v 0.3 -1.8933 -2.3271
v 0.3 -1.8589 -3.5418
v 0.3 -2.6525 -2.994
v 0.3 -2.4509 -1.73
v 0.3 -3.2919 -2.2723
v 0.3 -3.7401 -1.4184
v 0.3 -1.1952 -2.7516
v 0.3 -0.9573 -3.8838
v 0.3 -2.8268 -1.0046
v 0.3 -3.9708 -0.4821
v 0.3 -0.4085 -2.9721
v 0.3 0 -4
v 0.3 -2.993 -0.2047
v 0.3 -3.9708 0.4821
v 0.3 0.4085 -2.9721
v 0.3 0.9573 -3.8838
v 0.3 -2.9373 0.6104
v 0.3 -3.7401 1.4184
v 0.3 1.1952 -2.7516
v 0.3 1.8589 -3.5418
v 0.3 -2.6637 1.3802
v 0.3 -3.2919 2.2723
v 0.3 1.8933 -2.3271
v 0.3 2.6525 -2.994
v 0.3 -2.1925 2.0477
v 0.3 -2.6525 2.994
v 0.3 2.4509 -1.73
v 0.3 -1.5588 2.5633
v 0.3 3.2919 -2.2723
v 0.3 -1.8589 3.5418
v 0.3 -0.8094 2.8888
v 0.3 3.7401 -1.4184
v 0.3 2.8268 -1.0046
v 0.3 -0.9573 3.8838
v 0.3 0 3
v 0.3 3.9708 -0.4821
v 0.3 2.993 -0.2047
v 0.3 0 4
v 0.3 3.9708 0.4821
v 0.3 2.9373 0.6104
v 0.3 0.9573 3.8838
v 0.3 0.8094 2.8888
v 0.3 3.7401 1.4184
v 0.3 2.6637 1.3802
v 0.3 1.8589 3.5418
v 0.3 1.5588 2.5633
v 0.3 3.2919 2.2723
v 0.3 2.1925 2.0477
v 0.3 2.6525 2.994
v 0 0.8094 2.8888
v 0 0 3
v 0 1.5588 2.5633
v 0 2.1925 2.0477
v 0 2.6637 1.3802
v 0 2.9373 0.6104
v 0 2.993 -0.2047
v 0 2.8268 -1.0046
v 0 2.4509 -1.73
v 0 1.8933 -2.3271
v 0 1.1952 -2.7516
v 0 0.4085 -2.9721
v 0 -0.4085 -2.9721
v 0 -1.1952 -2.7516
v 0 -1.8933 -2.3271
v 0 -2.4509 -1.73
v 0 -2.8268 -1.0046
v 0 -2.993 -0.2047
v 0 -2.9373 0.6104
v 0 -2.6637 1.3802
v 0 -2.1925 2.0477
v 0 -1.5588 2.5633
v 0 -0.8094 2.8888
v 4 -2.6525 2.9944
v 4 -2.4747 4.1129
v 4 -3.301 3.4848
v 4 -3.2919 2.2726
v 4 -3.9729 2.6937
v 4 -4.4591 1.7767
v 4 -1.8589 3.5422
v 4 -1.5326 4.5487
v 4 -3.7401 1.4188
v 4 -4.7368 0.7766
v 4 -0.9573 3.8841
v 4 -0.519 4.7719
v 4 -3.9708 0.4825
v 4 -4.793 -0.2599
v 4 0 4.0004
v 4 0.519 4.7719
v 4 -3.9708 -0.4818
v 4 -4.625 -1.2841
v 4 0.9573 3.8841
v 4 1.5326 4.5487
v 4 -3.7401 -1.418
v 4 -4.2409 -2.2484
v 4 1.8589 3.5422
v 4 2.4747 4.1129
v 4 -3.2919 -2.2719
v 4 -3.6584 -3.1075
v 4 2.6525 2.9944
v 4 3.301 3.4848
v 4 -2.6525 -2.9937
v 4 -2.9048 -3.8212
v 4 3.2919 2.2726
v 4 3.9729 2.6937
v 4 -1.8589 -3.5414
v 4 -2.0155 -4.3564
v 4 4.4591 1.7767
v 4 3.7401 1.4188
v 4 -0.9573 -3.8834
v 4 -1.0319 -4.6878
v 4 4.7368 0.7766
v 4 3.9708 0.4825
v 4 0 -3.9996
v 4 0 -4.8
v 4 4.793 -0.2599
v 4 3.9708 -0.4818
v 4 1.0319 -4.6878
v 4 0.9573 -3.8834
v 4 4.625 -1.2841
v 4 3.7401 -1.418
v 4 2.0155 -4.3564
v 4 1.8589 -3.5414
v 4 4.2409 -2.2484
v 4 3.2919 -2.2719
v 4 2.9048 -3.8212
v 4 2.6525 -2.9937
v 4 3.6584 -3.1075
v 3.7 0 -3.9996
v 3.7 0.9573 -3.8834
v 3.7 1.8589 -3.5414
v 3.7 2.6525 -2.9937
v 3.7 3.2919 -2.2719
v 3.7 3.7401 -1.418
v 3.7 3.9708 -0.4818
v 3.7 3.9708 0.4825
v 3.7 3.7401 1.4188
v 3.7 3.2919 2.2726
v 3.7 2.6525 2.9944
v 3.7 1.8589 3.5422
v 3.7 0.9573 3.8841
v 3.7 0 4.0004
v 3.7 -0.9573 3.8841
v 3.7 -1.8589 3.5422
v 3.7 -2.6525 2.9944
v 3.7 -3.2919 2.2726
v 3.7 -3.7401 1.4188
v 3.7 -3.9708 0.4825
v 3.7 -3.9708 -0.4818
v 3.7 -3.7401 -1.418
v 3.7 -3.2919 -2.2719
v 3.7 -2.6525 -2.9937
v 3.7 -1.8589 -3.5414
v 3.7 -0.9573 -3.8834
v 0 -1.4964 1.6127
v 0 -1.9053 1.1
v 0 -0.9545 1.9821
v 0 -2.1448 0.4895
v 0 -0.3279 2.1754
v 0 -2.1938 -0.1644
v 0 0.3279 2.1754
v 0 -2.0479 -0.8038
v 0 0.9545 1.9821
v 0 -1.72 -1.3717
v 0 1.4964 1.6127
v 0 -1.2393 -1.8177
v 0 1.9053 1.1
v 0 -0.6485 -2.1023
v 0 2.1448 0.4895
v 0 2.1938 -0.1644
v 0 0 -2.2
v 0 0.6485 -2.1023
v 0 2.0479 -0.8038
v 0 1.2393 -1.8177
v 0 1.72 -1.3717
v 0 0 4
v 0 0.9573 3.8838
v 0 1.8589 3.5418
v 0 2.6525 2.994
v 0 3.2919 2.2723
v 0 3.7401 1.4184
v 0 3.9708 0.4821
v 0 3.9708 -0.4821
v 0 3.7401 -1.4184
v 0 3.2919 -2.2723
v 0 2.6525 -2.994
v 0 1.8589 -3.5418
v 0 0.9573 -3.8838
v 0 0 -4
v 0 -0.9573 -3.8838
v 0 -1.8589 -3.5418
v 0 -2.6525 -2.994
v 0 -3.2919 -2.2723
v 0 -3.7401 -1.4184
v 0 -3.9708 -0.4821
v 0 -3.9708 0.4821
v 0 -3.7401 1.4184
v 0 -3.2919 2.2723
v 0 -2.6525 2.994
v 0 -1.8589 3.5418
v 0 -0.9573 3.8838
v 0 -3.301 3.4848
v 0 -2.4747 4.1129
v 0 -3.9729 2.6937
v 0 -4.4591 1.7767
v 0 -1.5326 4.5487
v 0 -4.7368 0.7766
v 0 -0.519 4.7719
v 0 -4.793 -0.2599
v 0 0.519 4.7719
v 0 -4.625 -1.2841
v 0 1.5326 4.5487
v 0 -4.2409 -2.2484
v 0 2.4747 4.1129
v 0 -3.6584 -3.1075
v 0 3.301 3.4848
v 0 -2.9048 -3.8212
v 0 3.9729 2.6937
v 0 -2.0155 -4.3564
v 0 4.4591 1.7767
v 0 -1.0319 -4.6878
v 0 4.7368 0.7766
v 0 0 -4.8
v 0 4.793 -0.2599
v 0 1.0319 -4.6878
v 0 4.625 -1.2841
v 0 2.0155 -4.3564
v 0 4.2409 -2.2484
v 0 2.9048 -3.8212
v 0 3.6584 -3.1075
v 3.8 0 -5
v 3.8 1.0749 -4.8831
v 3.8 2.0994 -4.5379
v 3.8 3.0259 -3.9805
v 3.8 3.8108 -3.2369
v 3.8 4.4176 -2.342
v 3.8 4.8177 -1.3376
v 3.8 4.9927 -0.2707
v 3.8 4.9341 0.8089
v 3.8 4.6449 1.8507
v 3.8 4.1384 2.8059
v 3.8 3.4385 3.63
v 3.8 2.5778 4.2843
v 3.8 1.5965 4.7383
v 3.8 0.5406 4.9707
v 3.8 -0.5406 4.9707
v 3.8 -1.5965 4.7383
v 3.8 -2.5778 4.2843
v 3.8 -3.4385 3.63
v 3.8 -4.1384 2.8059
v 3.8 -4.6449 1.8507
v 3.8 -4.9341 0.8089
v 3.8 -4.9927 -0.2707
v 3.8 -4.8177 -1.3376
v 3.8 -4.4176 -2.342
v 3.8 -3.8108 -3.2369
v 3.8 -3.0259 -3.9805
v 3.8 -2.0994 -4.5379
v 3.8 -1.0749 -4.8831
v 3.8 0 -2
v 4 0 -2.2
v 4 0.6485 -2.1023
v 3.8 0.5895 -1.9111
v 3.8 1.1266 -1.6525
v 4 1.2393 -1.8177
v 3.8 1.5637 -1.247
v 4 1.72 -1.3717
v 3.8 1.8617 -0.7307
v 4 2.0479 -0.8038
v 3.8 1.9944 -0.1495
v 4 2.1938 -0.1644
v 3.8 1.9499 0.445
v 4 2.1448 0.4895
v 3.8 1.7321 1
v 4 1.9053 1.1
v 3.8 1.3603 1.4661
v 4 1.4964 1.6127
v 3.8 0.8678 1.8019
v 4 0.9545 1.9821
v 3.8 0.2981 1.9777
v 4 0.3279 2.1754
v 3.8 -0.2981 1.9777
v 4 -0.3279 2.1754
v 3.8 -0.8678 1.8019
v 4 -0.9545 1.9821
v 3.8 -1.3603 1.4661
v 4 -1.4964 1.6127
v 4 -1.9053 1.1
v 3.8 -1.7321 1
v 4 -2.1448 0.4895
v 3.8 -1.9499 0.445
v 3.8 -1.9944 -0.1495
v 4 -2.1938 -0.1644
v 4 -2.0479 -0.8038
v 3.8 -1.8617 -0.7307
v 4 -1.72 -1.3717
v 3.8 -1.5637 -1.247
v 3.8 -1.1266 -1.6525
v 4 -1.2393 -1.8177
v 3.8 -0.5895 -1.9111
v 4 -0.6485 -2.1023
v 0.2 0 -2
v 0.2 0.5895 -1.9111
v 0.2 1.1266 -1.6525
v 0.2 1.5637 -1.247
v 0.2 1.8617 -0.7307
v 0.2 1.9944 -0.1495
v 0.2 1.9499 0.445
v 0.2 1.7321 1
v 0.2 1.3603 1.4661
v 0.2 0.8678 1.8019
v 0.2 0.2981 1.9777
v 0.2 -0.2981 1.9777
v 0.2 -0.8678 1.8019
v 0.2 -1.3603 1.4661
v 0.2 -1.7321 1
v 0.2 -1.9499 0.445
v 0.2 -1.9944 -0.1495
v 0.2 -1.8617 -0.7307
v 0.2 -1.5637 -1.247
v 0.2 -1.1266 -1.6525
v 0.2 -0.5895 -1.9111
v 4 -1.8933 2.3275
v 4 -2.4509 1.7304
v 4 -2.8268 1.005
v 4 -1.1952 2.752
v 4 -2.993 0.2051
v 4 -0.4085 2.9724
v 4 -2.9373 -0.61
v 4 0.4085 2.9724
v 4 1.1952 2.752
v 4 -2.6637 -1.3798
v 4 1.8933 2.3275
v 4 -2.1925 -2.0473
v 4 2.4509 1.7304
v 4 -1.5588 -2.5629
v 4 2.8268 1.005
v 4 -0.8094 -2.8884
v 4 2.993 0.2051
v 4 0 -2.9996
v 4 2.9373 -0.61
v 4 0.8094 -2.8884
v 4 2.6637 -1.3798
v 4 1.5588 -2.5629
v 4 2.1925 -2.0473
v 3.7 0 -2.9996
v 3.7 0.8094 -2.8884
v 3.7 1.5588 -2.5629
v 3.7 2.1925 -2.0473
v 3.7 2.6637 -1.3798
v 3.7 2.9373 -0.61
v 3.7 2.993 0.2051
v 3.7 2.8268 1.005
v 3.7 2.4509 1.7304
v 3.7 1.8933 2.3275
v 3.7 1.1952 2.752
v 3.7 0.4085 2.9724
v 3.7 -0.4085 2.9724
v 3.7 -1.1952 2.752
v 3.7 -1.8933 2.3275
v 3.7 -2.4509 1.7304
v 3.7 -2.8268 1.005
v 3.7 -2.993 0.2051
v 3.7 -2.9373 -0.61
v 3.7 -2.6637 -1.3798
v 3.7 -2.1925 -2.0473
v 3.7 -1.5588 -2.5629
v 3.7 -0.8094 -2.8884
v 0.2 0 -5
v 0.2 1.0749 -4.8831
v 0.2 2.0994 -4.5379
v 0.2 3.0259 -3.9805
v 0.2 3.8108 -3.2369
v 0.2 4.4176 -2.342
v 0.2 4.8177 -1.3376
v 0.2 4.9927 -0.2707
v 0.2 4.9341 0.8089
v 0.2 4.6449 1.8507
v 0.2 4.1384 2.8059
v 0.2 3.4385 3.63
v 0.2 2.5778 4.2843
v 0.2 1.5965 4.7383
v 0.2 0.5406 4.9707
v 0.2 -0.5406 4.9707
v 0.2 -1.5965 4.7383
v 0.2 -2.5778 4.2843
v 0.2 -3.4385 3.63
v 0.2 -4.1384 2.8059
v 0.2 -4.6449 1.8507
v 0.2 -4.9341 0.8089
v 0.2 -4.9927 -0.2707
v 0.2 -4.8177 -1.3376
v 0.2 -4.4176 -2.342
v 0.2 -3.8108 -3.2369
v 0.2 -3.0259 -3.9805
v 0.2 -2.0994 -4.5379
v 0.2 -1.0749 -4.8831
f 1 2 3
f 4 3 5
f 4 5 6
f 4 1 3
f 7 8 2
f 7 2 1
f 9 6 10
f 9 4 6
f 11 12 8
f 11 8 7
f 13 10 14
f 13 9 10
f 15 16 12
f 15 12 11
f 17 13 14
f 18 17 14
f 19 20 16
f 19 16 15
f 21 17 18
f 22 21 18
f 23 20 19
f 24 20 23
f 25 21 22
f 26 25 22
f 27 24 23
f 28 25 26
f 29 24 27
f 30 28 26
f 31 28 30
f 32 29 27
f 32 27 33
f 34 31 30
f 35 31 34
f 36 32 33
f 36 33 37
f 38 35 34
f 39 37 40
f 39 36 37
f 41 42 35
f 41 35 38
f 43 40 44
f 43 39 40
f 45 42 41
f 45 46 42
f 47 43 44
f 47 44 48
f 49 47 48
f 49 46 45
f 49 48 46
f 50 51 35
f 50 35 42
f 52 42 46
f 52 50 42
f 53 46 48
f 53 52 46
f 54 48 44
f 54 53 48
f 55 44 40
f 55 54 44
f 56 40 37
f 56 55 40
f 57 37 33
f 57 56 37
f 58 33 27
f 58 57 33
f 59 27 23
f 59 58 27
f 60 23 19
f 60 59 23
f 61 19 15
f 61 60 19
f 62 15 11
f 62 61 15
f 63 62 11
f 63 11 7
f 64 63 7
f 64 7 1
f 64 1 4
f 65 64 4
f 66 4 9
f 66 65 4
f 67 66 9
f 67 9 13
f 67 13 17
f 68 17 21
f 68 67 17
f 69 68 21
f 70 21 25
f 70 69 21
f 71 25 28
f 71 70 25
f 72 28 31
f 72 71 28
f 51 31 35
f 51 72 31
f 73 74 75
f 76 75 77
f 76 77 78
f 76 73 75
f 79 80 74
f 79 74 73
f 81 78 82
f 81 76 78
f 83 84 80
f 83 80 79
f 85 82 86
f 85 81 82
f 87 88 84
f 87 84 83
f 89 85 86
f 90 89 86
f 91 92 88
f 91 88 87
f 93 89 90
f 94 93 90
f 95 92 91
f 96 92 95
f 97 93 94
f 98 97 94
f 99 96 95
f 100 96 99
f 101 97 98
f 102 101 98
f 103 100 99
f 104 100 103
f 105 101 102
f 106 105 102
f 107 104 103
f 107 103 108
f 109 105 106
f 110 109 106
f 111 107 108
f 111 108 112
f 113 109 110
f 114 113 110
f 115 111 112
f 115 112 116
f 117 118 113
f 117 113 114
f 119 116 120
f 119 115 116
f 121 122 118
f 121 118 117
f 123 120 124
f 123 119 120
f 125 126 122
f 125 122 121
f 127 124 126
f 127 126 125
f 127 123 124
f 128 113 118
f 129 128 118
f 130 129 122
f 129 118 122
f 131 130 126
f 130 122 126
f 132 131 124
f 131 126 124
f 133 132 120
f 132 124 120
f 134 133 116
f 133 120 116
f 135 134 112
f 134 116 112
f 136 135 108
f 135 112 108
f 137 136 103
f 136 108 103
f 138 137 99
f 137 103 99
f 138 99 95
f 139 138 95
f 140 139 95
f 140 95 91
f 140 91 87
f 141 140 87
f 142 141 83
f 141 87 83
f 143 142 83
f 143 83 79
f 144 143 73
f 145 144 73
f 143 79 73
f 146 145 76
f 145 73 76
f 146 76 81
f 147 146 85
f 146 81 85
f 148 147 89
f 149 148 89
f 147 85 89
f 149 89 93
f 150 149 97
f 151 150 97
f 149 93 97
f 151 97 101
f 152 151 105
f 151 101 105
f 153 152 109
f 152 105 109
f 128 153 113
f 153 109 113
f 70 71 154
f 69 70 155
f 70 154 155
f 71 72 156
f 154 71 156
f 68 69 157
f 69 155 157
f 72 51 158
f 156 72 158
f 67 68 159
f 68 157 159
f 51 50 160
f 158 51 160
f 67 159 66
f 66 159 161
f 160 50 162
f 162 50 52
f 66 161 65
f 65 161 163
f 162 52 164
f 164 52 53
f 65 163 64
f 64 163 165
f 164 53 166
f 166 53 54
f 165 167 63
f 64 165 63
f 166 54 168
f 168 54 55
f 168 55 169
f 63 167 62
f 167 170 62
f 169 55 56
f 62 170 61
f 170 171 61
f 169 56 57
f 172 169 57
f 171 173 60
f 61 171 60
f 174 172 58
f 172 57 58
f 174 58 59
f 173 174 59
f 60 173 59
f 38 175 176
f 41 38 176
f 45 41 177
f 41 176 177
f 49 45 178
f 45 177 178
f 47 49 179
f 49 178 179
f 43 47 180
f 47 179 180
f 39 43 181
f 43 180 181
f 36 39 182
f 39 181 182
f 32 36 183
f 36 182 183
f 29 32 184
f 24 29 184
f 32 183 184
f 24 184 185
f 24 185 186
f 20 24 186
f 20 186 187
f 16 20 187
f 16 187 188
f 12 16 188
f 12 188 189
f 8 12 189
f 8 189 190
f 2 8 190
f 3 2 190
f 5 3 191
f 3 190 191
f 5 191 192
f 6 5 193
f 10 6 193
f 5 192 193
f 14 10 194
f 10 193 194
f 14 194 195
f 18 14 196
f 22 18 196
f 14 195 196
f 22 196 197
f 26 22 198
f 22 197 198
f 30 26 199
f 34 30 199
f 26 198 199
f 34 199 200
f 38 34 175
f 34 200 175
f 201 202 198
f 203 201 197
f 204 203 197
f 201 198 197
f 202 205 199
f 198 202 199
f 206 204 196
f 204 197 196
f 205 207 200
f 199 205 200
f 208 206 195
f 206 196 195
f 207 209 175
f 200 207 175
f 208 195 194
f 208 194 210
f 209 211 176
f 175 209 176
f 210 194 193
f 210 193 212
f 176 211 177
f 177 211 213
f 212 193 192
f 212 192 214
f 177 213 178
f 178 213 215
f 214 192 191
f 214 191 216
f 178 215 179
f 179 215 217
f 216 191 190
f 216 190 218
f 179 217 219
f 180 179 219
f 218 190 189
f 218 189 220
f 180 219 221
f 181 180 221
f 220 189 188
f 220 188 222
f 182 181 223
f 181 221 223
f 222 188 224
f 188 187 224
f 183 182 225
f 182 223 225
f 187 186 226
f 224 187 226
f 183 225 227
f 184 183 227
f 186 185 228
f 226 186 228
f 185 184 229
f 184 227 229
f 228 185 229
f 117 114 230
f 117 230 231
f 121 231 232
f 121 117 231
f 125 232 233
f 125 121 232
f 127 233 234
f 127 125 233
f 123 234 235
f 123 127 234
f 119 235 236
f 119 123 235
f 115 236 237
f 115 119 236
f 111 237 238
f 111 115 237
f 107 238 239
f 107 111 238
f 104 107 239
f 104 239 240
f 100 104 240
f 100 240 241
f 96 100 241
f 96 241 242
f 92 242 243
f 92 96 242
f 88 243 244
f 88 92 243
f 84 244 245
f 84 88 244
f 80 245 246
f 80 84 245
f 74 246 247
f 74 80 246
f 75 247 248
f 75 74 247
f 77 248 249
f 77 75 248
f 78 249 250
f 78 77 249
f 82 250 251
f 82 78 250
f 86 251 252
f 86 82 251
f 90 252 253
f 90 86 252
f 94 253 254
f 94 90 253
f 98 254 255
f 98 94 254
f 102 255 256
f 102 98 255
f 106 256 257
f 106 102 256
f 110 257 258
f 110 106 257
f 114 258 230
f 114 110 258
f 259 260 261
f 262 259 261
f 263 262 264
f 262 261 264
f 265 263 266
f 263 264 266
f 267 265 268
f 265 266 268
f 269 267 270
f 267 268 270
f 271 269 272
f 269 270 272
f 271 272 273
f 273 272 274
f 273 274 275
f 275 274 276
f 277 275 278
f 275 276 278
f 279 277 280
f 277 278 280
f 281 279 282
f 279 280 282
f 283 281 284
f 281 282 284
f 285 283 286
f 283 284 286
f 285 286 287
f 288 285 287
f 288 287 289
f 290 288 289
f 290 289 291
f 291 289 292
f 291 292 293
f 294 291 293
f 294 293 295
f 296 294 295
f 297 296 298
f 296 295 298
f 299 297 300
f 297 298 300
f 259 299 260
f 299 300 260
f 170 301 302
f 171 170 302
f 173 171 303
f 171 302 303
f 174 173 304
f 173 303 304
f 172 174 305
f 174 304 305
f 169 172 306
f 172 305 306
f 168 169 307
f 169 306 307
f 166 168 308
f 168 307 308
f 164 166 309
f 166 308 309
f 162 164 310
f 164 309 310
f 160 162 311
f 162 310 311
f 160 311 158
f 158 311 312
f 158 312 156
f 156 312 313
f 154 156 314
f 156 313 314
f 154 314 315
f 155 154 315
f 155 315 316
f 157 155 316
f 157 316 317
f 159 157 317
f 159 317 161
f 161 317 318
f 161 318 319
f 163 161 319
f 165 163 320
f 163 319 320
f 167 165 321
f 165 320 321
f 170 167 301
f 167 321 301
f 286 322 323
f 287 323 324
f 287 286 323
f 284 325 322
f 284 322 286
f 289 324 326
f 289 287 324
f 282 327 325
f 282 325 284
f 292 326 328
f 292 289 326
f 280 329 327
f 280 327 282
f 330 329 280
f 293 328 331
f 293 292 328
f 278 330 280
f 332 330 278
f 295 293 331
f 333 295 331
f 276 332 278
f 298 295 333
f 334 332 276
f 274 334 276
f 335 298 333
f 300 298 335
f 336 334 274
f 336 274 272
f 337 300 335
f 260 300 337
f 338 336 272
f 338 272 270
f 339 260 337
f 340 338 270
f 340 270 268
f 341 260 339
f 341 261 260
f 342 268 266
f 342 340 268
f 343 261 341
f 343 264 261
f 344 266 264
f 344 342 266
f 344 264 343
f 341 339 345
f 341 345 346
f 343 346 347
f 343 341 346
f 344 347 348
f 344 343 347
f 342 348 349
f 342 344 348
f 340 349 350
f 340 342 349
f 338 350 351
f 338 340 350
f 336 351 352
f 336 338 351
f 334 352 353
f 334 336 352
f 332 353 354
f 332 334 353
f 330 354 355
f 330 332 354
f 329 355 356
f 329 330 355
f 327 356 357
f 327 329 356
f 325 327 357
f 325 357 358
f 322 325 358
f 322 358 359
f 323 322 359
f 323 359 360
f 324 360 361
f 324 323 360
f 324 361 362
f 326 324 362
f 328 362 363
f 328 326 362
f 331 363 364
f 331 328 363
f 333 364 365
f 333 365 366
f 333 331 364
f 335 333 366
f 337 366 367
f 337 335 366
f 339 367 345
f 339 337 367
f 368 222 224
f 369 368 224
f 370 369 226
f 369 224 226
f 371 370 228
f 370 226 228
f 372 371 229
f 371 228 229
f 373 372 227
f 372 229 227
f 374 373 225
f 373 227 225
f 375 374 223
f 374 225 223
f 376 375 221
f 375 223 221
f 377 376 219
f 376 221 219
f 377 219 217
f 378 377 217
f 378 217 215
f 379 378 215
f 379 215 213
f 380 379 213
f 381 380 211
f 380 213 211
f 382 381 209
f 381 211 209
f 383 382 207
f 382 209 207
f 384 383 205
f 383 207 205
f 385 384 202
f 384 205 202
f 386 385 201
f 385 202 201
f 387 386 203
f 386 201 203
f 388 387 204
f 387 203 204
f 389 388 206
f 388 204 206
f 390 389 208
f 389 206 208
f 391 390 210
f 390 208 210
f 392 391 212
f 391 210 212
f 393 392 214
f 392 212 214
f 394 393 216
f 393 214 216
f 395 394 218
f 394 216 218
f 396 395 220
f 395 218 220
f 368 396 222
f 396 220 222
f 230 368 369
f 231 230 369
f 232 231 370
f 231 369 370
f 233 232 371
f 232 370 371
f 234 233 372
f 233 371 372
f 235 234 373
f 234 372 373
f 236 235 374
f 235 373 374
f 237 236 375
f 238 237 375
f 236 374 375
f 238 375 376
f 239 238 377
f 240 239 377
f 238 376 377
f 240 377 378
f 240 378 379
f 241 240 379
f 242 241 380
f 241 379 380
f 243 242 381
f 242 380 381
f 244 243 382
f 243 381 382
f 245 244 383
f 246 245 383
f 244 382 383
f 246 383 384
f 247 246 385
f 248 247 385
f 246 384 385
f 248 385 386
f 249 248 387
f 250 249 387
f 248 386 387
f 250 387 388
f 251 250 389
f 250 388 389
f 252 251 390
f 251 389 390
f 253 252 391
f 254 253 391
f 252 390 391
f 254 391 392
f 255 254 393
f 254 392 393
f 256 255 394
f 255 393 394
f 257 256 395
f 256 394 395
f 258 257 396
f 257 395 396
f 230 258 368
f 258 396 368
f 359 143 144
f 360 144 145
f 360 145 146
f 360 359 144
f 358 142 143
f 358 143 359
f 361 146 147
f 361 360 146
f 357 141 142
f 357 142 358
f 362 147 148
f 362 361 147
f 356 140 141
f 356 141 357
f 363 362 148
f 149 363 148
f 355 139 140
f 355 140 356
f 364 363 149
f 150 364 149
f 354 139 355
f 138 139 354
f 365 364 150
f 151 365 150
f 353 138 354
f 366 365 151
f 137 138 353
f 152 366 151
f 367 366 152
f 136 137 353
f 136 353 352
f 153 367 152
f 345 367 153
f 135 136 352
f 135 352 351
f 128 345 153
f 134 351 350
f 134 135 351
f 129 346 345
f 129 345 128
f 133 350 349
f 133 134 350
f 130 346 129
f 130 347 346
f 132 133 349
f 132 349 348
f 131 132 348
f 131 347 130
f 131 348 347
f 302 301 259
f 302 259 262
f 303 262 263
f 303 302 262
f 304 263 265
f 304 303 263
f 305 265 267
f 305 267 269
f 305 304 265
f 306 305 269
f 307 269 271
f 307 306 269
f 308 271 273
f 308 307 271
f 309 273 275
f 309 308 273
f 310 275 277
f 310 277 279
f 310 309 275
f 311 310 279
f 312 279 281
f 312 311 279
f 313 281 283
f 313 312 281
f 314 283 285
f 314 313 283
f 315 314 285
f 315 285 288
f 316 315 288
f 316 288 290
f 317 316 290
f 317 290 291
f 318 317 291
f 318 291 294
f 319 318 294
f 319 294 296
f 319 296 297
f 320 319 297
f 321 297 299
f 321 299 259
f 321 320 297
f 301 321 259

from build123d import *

# Parameters (mm, degrees)
SKETCH_1_R          = 5
SKETCH_1_R_2        = 2
EXTRUDE_1_DEPTH     = 4
SKETCH_2_R          = 4
SKETCH_2_R_2        = 3
CUT_EXTRUDE_1_DEPTH = 0.3
CHAMFER_1_SIZE      = 0.2
SKETCH_3_R          = 4
SKETCH_3_R_2        = 3
CUT_EXTRUDE_2_DEPTH = 0.3


with BuildPart() as part:
    # 草图1 → 凸台-拉伸1 (new body)
    with BuildSketch(Plane(origin=(0, 0, 0), x_dir=(0, 0, -1), z_dir=(1, 0, 0))):
        Circle(SKETCH_1_R)
        Circle(SKETCH_1_R_2, mode=Mode.SUBTRACT)
    extrude(amount=EXTRUDE_1_DEPTH)

    # 草图2 → 切除-拉伸1 (cut)
    with BuildSketch(Plane(origin=(4, 0, 0), x_dir=(0, 0, -1), z_dir=(1, 0, 0))):
        with Locations((-0.000375625, 0)):
            Circle(SKETCH_2_R)
        with Locations((-0.000375625, 0)):
            Circle(SKETCH_2_R_2, mode=Mode.SUBTRACT)
    extrude(amount=-CUT_EXTRUDE_1_DEPTH, mode=Mode.SUBTRACT)

    # 倒角1
    chamfer_1_edges = [part.edges().sort_by_distance(p)[0] for p in [
        (0, 0, 5),
        (4, 0, 5),
        (0, 0, 2),
        (4, 0, 2),
    ]]
    chamfer(chamfer_1_edges, length=CHAMFER_1_SIZE)

    # 草图3 → 切除-拉伸2 (cut)
    with BuildSketch(Plane.ZY):
        Circle(SKETCH_3_R)
        Circle(SKETCH_3_R_2, mode=Mode.SUBTRACT)
    extrude(amount=-CUT_EXTRUDE_2_DEPTH, mode=Mode.SUBTRACT)


solid = part.part
